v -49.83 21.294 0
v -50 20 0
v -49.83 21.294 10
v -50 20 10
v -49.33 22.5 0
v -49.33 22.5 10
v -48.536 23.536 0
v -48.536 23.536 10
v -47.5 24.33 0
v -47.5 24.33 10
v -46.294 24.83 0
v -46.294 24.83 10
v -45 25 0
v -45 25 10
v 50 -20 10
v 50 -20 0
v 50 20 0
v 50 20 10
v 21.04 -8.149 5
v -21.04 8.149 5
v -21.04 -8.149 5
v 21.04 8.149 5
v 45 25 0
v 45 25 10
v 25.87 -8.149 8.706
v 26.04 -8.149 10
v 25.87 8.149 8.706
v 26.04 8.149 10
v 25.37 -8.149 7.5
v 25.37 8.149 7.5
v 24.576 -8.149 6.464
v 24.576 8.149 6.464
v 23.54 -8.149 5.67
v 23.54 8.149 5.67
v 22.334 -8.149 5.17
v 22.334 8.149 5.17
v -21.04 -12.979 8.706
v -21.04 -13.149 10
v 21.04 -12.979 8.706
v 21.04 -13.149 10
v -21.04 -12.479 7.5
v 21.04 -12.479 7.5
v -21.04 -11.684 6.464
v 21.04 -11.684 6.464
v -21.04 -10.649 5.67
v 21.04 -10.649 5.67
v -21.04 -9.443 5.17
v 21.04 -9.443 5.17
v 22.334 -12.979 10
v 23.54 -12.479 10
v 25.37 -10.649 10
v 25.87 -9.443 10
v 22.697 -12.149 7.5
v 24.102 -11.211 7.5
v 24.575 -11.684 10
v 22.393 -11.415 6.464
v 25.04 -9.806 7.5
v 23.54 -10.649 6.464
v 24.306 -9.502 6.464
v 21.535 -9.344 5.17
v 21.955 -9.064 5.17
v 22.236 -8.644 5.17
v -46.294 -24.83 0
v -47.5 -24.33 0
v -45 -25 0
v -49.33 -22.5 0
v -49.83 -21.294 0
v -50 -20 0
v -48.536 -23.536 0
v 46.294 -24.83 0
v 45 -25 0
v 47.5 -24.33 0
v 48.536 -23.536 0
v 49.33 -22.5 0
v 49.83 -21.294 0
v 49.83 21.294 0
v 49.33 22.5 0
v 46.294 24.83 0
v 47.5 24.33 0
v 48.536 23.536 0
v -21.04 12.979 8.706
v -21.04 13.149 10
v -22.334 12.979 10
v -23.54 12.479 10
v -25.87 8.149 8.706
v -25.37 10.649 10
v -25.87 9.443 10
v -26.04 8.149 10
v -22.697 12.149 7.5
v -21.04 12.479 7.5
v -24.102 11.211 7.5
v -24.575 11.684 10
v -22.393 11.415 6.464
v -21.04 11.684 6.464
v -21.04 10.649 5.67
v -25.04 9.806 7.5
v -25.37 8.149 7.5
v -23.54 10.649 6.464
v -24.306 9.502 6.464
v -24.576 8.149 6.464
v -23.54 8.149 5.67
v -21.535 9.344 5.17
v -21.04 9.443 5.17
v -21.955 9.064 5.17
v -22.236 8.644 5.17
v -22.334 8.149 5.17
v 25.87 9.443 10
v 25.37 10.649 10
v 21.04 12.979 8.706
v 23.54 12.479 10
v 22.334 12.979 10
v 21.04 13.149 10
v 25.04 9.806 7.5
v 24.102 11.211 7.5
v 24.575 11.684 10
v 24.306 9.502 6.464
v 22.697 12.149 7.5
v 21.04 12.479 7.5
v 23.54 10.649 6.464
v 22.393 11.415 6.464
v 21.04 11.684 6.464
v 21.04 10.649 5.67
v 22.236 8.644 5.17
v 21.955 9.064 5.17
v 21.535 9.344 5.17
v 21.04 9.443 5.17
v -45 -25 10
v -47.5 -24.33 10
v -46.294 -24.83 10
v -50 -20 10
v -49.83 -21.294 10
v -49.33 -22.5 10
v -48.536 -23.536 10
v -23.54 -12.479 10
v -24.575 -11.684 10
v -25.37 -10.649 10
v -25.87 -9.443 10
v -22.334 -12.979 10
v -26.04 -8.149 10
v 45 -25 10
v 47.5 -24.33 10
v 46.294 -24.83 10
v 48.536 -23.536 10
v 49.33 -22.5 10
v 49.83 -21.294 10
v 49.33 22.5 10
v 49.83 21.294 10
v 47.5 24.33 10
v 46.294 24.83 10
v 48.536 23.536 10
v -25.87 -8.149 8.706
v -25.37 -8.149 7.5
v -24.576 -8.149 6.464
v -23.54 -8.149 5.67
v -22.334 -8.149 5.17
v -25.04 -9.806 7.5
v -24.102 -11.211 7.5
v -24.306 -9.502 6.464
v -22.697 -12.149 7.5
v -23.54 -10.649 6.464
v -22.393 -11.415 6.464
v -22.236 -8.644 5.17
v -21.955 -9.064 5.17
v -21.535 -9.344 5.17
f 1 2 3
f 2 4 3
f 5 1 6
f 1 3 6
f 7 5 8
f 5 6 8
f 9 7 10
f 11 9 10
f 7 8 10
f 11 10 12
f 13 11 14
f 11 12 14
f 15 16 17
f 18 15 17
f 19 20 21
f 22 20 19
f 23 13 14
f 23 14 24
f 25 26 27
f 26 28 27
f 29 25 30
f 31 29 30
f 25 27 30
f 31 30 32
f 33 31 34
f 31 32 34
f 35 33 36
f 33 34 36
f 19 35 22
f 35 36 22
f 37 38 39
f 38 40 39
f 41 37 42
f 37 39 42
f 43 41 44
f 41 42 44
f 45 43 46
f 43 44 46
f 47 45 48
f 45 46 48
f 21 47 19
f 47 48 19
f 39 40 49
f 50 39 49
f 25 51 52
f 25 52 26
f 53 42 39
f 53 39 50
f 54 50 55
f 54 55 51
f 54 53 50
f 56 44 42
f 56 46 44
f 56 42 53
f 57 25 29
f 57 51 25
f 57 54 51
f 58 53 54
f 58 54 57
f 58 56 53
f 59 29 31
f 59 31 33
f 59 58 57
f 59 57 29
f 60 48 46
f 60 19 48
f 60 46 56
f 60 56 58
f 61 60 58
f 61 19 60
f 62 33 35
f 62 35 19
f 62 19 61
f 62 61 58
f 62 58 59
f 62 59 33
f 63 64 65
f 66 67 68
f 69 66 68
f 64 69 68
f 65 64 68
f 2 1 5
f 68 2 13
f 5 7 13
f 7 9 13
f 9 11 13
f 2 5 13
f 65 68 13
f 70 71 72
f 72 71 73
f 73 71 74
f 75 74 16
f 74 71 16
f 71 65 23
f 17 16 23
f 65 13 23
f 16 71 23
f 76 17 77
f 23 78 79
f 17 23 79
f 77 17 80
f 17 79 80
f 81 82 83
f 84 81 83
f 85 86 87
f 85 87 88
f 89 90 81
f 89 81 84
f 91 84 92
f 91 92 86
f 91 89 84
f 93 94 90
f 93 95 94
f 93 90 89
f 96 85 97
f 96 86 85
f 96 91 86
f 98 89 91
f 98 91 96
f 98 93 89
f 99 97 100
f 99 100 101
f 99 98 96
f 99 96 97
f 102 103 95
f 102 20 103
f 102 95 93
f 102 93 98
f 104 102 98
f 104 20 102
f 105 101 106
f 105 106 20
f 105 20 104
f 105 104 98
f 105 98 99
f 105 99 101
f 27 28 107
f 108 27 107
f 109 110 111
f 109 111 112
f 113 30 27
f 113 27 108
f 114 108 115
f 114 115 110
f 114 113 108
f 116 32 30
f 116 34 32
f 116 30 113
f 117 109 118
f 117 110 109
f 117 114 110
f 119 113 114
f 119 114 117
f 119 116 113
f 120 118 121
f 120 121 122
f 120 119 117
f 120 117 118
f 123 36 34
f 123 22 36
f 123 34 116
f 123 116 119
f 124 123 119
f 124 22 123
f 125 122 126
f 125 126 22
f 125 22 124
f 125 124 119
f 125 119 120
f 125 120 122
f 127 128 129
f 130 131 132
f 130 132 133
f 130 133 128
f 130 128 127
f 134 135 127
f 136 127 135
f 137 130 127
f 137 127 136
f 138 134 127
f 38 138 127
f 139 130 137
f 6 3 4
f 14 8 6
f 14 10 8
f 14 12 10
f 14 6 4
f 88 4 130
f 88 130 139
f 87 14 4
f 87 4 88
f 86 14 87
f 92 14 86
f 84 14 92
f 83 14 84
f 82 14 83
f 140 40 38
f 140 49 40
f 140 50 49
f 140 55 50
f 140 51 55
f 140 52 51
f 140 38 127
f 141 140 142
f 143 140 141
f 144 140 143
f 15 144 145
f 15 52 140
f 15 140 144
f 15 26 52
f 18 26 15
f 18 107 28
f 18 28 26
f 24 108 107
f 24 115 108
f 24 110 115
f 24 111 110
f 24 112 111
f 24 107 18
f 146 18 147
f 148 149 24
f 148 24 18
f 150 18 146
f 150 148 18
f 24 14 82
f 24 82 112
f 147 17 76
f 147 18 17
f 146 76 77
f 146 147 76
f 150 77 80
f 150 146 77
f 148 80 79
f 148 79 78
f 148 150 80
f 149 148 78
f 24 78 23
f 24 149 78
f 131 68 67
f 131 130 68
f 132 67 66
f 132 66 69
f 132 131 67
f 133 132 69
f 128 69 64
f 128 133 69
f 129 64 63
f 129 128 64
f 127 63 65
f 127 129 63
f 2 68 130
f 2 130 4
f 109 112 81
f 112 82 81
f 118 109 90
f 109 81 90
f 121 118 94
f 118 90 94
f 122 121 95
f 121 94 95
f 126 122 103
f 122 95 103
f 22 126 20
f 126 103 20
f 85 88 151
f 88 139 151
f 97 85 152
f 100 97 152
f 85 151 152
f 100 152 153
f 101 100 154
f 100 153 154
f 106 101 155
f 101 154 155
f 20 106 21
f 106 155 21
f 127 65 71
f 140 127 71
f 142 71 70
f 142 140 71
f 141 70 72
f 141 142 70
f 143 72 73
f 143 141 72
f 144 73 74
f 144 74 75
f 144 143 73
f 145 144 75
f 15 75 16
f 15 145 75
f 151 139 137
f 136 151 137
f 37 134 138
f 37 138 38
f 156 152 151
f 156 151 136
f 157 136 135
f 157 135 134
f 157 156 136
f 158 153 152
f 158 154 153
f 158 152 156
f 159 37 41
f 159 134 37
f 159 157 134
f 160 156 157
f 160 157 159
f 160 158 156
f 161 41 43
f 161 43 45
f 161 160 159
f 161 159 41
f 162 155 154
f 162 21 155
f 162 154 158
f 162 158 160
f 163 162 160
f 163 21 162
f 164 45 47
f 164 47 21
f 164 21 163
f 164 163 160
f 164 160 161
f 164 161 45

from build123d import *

# Parameters (mm, degrees)
F0_W     = 100
F0_H     = 50
F1_DEPTH = 10
F2_R     = 5
F3_W     = 52.0799309015
F3_H     = 26.2977816164
F4_DEPTH = 5
F5_R     = 5
F6_R     = 4.99999


# Not quite as in the source:
# - a fillet or chamfer is up to 0.001 mm smaller than in the source, because OpenCascade refuses the exact size


with BuildPart() as f1:
    # F0 (on Top) → F1 (new body)
    with BuildSketch(Plane.XY):
        Rectangle(F0_W, F0_H)
    extrude(amount=F1_DEPTH)

    # F2
    f2_edges = [f1.edges().sort_by_distance(p)[0] for p in [
        (-50, -25, 5),
        (-50, 25, 5),
        (50, -25, 5),
        (50, 25, 5),
    ]]
    fillet(f2_edges, radius=F2_R)

    # F3 (on face) → F4 (cut)
    with BuildSketch(Plane.XY.offset(10)):
        Rectangle(F3_W, F3_H)
    extrude(amount=-F4_DEPTH, mode=Mode.SUBTRACT)

    # F5
    f5_edges = [f1.edges().sort_by_distance(p)[0] for p in [
        (-26.039965, 13.148891, 7.5),
        (26.039965, 13.148891, 7.5),
        (26.039965, -13.148891, 7.5),
        (-26.039965, -13.148891, 7.5),
    ]]
    fillet(f5_edges, radius=F5_R)

    # F6 (radius 5 in the source; OpenCascade refuses exactly that, so slightly less here)
    f6_edges = [f1.edges().sort_by_distance(p)[0] for p in [
        (0, -13.148891, 5),
        (-24.575499, -11.684425, 5),
        (24.575499, -11.684425, 5),
        (-26.039965, 0, 5),
        (26.039965, 0, 5),
        (-24.575499, 11.684425, 5),
        (24.575499, 11.684425, 5),
        (0, 13.148891, 5),
    ]]
    fillet(f6_edges, radius=F6_R)


solid = f1.part
